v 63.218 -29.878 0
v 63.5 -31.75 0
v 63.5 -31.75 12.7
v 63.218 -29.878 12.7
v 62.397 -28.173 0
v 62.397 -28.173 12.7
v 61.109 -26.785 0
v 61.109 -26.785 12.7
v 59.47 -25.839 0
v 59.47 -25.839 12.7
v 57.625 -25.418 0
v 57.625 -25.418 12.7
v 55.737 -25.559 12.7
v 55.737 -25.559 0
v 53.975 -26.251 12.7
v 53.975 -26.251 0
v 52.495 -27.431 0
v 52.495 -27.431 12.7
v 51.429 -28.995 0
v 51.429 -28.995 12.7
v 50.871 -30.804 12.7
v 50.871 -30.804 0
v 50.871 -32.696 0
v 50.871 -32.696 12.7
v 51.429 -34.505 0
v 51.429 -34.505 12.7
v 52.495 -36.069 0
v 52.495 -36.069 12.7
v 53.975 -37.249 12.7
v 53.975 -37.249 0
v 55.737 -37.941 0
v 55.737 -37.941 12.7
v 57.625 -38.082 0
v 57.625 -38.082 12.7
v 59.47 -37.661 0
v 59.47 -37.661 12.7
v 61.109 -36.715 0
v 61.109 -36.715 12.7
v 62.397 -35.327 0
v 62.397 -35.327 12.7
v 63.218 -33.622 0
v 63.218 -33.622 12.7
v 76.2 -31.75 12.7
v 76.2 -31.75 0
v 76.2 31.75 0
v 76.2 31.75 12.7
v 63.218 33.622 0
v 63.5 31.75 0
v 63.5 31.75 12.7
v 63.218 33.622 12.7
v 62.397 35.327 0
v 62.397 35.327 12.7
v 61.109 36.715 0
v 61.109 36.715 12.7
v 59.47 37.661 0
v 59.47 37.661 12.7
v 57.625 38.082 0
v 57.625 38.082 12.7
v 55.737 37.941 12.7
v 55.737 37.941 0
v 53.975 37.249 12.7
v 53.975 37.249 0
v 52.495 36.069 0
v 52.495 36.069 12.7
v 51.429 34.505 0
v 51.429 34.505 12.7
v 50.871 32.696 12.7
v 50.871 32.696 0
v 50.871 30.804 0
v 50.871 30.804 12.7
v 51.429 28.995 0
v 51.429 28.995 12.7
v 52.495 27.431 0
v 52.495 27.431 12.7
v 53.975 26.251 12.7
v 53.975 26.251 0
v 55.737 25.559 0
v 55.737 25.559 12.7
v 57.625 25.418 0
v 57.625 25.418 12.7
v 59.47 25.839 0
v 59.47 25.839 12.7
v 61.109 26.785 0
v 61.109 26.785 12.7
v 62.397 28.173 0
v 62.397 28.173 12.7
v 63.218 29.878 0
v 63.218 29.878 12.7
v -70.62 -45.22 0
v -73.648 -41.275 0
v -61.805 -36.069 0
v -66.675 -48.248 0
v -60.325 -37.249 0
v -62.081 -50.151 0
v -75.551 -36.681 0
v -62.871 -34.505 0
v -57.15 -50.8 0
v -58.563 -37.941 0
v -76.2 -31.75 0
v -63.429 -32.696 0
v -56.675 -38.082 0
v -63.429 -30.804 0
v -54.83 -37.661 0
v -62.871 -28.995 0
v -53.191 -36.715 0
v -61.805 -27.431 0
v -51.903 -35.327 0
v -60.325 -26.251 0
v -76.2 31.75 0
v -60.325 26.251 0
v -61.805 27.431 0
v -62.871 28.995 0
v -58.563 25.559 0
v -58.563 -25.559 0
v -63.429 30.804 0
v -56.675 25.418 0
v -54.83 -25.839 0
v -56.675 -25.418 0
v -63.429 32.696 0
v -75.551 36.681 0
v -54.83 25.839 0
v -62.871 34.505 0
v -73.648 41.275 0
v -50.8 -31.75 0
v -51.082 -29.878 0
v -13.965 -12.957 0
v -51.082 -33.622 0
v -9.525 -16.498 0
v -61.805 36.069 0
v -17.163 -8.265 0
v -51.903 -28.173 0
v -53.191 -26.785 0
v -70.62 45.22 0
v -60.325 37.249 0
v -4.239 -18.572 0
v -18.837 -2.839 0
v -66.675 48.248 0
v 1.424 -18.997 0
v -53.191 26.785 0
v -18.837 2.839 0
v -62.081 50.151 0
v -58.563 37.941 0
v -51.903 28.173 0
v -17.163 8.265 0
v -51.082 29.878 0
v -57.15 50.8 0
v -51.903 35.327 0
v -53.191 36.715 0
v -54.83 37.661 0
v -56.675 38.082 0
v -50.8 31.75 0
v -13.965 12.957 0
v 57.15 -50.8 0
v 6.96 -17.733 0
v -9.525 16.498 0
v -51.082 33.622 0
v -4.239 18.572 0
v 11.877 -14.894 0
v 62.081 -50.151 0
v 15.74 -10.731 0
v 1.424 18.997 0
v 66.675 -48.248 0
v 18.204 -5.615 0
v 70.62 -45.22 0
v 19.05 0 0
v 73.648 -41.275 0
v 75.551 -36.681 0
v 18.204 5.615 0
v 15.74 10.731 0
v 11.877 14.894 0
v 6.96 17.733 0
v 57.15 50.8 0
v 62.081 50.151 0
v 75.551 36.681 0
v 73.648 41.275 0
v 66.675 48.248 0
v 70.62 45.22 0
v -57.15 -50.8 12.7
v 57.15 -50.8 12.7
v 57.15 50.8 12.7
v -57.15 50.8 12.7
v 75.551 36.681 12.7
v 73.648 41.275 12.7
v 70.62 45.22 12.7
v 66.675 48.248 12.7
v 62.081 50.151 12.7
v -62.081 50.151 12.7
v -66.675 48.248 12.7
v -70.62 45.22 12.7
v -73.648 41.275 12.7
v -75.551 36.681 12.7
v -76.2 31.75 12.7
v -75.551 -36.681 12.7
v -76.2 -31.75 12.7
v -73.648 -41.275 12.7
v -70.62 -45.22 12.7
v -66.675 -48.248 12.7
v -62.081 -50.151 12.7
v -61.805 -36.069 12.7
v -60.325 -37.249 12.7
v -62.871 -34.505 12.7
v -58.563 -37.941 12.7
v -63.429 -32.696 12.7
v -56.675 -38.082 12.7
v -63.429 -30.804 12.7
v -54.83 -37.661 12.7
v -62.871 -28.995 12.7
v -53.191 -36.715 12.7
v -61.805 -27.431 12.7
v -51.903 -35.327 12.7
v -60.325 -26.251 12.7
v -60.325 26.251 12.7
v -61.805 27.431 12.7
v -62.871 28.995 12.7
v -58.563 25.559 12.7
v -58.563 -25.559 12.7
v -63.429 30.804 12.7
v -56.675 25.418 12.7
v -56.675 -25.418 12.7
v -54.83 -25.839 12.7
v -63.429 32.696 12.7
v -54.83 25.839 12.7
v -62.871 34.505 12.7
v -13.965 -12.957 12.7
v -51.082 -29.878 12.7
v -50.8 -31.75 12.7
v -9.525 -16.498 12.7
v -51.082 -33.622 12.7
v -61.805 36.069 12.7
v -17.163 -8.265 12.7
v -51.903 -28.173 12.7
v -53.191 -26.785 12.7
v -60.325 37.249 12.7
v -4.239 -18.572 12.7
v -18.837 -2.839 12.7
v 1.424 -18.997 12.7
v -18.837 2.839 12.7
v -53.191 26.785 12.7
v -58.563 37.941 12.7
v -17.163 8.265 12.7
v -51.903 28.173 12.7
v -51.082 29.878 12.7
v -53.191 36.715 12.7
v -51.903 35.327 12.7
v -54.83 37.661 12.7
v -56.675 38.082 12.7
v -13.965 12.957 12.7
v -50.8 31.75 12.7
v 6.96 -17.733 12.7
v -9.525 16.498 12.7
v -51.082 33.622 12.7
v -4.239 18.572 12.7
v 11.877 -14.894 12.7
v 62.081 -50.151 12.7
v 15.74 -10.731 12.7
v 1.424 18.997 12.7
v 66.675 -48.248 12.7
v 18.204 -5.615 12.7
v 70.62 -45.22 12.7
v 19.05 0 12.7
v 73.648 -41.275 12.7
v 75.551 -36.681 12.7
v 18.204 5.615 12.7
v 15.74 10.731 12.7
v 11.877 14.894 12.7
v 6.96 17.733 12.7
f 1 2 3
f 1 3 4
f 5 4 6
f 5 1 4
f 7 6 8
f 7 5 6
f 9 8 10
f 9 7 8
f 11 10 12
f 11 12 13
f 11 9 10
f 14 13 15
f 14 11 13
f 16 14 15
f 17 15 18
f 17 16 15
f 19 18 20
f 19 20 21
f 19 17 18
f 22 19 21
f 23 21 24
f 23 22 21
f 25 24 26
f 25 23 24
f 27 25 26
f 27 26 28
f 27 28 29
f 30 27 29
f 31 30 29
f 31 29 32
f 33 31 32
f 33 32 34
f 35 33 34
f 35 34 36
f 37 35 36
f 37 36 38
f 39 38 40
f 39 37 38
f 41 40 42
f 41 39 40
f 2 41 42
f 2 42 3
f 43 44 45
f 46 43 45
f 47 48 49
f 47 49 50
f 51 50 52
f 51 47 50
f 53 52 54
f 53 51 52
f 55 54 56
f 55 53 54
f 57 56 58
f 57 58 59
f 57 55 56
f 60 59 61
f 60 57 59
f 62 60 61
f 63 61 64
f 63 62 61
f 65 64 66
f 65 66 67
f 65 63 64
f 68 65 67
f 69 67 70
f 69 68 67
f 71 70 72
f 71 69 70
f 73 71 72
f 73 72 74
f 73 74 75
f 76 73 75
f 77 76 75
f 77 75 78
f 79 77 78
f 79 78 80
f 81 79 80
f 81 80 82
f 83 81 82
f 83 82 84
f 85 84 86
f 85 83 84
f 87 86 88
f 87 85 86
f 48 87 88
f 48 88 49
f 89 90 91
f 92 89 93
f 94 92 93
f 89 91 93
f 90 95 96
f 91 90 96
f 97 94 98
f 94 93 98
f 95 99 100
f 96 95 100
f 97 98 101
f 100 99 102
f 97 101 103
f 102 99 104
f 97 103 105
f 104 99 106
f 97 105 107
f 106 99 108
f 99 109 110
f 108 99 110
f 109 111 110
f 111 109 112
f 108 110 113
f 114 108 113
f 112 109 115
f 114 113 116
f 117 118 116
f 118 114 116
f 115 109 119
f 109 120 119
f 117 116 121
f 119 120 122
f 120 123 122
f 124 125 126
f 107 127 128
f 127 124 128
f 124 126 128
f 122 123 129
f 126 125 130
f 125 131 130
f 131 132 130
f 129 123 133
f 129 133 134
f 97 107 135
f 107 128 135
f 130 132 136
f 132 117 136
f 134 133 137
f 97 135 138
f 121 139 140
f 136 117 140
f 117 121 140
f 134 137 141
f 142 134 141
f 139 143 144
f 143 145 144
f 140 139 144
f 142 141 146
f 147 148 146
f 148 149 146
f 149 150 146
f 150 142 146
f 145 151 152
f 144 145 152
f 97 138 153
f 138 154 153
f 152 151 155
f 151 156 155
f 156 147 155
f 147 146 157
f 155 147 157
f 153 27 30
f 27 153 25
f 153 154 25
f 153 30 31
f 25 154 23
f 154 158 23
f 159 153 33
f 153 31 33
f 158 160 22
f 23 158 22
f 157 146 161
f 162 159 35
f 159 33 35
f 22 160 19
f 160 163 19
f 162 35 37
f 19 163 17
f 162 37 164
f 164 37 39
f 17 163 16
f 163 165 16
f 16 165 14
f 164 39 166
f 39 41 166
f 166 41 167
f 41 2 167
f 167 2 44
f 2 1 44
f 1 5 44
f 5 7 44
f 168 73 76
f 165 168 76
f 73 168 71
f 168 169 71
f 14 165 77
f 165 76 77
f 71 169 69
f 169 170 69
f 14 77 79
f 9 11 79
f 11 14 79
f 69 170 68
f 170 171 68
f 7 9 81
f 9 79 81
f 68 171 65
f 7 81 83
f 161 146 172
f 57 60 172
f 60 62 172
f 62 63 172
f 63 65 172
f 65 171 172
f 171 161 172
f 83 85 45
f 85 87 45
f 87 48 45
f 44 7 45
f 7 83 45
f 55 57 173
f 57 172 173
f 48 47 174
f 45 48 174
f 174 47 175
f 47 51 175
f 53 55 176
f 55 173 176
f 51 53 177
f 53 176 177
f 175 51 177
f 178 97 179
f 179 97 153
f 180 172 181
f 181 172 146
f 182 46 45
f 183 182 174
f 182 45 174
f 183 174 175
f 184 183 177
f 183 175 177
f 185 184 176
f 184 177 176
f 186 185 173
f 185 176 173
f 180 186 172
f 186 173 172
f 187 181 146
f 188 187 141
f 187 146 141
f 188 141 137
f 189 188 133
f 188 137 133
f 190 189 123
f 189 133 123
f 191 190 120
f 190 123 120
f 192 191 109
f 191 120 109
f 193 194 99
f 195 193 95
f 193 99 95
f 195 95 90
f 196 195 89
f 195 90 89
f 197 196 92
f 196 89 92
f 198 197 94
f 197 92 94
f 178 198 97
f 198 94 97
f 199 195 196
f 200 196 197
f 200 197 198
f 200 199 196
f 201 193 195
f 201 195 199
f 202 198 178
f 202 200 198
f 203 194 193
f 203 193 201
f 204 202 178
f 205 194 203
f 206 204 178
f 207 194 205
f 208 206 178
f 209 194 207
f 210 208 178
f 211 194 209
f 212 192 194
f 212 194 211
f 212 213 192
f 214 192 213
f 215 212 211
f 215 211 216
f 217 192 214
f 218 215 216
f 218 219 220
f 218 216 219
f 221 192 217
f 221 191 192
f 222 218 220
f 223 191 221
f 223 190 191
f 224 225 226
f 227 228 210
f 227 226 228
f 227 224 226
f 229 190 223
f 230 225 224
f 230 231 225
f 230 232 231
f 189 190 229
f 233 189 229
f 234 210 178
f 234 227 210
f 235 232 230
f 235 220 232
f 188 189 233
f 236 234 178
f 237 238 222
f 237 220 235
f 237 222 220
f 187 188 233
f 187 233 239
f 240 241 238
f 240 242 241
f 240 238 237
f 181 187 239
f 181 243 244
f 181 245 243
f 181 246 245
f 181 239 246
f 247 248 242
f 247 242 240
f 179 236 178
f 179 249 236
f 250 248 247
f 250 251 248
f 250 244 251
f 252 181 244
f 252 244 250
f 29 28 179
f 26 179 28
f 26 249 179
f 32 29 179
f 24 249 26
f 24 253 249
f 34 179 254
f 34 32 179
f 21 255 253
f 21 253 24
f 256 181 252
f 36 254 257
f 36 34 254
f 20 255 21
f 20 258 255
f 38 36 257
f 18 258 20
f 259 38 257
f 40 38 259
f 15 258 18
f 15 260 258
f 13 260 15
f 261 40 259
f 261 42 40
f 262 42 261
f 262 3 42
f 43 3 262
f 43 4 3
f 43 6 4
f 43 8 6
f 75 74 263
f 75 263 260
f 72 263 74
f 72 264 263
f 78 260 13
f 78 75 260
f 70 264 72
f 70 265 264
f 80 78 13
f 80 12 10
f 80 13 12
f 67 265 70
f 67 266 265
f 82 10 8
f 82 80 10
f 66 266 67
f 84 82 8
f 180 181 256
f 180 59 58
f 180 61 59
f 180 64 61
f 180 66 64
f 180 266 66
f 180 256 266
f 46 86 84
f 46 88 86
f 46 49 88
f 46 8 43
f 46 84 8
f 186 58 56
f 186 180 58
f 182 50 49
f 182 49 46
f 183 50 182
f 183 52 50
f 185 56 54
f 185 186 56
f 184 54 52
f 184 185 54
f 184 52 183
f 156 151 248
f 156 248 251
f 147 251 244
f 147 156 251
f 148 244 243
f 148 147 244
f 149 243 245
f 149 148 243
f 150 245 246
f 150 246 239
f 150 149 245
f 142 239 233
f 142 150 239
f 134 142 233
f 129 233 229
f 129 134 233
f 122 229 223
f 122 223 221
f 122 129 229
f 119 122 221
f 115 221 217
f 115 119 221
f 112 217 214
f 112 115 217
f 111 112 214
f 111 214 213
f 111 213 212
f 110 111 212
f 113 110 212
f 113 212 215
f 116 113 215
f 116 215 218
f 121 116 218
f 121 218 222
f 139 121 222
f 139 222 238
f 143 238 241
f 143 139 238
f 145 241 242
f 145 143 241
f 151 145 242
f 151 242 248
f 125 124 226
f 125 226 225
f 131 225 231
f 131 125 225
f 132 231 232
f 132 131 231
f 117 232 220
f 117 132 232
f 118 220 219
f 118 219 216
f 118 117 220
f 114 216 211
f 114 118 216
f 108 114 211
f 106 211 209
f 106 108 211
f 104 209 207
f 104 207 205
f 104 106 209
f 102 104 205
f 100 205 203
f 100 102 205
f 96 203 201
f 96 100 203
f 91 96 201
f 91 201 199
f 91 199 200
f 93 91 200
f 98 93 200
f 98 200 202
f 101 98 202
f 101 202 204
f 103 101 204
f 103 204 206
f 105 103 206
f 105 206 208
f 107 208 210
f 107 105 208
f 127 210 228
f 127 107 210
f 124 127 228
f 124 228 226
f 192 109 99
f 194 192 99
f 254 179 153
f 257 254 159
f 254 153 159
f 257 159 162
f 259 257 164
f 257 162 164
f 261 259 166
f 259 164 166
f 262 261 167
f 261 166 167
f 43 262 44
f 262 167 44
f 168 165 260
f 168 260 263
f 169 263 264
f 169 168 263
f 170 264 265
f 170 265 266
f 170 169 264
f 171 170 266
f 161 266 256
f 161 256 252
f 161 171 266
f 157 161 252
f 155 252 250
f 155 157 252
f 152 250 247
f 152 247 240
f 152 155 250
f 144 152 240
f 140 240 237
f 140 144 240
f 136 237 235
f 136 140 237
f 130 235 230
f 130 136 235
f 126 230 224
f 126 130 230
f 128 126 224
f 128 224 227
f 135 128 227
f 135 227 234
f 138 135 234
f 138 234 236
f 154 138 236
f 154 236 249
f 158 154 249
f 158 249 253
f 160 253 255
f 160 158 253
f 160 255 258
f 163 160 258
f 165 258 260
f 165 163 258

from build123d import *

# Parameters (mm, degrees)
F0_R     = 6.35
F0_R_2   = 19.05
F1_DEPTH = 12.7


# Not quite as in the source:
# - a feature names something its author has since deleted; it is built from what else it names


with BuildPart() as f1:
    # F0 (on Top) → F1 (new body)
    with BuildSketch(Plane.XY):
        with BuildLine():
            ThreePointArc((76.2, 31.75), (70.6203841816, 45.2203841816), (57.15, 50.8))
            Line((57.15, 50.8), (-57.15, 50.8))
            ThreePointArc((-57.15, 50.8), (-70.6203841816, 45.2203841816), (-76.2, 31.75))
            Line((-76.2, 31.75), (-76.2, -31.75))
            ThreePointArc((-76.2, -31.75), (-70.6203841816, -45.2203841816), (-57.15, -50.8))
            Line((-57.15, -50.8), (57.15, -50.8))
            ThreePointArc((57.15, -50.8), (70.6203841816, -45.2203841816), (76.2, -31.75))
            Line((76.2, -31.75), (76.2, 31.75))
        make_face()
        with Locations((-57.15, -31.75)):
            Circle(F0_R, mode=Mode.SUBTRACT)
        with Locations((57.15, -31.75)):
            Circle(F0_R, mode=Mode.SUBTRACT)
        Circle(F0_R_2, mode=Mode.SUBTRACT)
        with Locations((-57.15, 31.75)):
            Circle(F0_R, mode=Mode.SUBTRACT)
        with Locations((57.15, 31.75)):
            Circle(F0_R, mode=Mode.SUBTRACT)
    extrude(amount=F1_DEPTH)


solid = f1.part
